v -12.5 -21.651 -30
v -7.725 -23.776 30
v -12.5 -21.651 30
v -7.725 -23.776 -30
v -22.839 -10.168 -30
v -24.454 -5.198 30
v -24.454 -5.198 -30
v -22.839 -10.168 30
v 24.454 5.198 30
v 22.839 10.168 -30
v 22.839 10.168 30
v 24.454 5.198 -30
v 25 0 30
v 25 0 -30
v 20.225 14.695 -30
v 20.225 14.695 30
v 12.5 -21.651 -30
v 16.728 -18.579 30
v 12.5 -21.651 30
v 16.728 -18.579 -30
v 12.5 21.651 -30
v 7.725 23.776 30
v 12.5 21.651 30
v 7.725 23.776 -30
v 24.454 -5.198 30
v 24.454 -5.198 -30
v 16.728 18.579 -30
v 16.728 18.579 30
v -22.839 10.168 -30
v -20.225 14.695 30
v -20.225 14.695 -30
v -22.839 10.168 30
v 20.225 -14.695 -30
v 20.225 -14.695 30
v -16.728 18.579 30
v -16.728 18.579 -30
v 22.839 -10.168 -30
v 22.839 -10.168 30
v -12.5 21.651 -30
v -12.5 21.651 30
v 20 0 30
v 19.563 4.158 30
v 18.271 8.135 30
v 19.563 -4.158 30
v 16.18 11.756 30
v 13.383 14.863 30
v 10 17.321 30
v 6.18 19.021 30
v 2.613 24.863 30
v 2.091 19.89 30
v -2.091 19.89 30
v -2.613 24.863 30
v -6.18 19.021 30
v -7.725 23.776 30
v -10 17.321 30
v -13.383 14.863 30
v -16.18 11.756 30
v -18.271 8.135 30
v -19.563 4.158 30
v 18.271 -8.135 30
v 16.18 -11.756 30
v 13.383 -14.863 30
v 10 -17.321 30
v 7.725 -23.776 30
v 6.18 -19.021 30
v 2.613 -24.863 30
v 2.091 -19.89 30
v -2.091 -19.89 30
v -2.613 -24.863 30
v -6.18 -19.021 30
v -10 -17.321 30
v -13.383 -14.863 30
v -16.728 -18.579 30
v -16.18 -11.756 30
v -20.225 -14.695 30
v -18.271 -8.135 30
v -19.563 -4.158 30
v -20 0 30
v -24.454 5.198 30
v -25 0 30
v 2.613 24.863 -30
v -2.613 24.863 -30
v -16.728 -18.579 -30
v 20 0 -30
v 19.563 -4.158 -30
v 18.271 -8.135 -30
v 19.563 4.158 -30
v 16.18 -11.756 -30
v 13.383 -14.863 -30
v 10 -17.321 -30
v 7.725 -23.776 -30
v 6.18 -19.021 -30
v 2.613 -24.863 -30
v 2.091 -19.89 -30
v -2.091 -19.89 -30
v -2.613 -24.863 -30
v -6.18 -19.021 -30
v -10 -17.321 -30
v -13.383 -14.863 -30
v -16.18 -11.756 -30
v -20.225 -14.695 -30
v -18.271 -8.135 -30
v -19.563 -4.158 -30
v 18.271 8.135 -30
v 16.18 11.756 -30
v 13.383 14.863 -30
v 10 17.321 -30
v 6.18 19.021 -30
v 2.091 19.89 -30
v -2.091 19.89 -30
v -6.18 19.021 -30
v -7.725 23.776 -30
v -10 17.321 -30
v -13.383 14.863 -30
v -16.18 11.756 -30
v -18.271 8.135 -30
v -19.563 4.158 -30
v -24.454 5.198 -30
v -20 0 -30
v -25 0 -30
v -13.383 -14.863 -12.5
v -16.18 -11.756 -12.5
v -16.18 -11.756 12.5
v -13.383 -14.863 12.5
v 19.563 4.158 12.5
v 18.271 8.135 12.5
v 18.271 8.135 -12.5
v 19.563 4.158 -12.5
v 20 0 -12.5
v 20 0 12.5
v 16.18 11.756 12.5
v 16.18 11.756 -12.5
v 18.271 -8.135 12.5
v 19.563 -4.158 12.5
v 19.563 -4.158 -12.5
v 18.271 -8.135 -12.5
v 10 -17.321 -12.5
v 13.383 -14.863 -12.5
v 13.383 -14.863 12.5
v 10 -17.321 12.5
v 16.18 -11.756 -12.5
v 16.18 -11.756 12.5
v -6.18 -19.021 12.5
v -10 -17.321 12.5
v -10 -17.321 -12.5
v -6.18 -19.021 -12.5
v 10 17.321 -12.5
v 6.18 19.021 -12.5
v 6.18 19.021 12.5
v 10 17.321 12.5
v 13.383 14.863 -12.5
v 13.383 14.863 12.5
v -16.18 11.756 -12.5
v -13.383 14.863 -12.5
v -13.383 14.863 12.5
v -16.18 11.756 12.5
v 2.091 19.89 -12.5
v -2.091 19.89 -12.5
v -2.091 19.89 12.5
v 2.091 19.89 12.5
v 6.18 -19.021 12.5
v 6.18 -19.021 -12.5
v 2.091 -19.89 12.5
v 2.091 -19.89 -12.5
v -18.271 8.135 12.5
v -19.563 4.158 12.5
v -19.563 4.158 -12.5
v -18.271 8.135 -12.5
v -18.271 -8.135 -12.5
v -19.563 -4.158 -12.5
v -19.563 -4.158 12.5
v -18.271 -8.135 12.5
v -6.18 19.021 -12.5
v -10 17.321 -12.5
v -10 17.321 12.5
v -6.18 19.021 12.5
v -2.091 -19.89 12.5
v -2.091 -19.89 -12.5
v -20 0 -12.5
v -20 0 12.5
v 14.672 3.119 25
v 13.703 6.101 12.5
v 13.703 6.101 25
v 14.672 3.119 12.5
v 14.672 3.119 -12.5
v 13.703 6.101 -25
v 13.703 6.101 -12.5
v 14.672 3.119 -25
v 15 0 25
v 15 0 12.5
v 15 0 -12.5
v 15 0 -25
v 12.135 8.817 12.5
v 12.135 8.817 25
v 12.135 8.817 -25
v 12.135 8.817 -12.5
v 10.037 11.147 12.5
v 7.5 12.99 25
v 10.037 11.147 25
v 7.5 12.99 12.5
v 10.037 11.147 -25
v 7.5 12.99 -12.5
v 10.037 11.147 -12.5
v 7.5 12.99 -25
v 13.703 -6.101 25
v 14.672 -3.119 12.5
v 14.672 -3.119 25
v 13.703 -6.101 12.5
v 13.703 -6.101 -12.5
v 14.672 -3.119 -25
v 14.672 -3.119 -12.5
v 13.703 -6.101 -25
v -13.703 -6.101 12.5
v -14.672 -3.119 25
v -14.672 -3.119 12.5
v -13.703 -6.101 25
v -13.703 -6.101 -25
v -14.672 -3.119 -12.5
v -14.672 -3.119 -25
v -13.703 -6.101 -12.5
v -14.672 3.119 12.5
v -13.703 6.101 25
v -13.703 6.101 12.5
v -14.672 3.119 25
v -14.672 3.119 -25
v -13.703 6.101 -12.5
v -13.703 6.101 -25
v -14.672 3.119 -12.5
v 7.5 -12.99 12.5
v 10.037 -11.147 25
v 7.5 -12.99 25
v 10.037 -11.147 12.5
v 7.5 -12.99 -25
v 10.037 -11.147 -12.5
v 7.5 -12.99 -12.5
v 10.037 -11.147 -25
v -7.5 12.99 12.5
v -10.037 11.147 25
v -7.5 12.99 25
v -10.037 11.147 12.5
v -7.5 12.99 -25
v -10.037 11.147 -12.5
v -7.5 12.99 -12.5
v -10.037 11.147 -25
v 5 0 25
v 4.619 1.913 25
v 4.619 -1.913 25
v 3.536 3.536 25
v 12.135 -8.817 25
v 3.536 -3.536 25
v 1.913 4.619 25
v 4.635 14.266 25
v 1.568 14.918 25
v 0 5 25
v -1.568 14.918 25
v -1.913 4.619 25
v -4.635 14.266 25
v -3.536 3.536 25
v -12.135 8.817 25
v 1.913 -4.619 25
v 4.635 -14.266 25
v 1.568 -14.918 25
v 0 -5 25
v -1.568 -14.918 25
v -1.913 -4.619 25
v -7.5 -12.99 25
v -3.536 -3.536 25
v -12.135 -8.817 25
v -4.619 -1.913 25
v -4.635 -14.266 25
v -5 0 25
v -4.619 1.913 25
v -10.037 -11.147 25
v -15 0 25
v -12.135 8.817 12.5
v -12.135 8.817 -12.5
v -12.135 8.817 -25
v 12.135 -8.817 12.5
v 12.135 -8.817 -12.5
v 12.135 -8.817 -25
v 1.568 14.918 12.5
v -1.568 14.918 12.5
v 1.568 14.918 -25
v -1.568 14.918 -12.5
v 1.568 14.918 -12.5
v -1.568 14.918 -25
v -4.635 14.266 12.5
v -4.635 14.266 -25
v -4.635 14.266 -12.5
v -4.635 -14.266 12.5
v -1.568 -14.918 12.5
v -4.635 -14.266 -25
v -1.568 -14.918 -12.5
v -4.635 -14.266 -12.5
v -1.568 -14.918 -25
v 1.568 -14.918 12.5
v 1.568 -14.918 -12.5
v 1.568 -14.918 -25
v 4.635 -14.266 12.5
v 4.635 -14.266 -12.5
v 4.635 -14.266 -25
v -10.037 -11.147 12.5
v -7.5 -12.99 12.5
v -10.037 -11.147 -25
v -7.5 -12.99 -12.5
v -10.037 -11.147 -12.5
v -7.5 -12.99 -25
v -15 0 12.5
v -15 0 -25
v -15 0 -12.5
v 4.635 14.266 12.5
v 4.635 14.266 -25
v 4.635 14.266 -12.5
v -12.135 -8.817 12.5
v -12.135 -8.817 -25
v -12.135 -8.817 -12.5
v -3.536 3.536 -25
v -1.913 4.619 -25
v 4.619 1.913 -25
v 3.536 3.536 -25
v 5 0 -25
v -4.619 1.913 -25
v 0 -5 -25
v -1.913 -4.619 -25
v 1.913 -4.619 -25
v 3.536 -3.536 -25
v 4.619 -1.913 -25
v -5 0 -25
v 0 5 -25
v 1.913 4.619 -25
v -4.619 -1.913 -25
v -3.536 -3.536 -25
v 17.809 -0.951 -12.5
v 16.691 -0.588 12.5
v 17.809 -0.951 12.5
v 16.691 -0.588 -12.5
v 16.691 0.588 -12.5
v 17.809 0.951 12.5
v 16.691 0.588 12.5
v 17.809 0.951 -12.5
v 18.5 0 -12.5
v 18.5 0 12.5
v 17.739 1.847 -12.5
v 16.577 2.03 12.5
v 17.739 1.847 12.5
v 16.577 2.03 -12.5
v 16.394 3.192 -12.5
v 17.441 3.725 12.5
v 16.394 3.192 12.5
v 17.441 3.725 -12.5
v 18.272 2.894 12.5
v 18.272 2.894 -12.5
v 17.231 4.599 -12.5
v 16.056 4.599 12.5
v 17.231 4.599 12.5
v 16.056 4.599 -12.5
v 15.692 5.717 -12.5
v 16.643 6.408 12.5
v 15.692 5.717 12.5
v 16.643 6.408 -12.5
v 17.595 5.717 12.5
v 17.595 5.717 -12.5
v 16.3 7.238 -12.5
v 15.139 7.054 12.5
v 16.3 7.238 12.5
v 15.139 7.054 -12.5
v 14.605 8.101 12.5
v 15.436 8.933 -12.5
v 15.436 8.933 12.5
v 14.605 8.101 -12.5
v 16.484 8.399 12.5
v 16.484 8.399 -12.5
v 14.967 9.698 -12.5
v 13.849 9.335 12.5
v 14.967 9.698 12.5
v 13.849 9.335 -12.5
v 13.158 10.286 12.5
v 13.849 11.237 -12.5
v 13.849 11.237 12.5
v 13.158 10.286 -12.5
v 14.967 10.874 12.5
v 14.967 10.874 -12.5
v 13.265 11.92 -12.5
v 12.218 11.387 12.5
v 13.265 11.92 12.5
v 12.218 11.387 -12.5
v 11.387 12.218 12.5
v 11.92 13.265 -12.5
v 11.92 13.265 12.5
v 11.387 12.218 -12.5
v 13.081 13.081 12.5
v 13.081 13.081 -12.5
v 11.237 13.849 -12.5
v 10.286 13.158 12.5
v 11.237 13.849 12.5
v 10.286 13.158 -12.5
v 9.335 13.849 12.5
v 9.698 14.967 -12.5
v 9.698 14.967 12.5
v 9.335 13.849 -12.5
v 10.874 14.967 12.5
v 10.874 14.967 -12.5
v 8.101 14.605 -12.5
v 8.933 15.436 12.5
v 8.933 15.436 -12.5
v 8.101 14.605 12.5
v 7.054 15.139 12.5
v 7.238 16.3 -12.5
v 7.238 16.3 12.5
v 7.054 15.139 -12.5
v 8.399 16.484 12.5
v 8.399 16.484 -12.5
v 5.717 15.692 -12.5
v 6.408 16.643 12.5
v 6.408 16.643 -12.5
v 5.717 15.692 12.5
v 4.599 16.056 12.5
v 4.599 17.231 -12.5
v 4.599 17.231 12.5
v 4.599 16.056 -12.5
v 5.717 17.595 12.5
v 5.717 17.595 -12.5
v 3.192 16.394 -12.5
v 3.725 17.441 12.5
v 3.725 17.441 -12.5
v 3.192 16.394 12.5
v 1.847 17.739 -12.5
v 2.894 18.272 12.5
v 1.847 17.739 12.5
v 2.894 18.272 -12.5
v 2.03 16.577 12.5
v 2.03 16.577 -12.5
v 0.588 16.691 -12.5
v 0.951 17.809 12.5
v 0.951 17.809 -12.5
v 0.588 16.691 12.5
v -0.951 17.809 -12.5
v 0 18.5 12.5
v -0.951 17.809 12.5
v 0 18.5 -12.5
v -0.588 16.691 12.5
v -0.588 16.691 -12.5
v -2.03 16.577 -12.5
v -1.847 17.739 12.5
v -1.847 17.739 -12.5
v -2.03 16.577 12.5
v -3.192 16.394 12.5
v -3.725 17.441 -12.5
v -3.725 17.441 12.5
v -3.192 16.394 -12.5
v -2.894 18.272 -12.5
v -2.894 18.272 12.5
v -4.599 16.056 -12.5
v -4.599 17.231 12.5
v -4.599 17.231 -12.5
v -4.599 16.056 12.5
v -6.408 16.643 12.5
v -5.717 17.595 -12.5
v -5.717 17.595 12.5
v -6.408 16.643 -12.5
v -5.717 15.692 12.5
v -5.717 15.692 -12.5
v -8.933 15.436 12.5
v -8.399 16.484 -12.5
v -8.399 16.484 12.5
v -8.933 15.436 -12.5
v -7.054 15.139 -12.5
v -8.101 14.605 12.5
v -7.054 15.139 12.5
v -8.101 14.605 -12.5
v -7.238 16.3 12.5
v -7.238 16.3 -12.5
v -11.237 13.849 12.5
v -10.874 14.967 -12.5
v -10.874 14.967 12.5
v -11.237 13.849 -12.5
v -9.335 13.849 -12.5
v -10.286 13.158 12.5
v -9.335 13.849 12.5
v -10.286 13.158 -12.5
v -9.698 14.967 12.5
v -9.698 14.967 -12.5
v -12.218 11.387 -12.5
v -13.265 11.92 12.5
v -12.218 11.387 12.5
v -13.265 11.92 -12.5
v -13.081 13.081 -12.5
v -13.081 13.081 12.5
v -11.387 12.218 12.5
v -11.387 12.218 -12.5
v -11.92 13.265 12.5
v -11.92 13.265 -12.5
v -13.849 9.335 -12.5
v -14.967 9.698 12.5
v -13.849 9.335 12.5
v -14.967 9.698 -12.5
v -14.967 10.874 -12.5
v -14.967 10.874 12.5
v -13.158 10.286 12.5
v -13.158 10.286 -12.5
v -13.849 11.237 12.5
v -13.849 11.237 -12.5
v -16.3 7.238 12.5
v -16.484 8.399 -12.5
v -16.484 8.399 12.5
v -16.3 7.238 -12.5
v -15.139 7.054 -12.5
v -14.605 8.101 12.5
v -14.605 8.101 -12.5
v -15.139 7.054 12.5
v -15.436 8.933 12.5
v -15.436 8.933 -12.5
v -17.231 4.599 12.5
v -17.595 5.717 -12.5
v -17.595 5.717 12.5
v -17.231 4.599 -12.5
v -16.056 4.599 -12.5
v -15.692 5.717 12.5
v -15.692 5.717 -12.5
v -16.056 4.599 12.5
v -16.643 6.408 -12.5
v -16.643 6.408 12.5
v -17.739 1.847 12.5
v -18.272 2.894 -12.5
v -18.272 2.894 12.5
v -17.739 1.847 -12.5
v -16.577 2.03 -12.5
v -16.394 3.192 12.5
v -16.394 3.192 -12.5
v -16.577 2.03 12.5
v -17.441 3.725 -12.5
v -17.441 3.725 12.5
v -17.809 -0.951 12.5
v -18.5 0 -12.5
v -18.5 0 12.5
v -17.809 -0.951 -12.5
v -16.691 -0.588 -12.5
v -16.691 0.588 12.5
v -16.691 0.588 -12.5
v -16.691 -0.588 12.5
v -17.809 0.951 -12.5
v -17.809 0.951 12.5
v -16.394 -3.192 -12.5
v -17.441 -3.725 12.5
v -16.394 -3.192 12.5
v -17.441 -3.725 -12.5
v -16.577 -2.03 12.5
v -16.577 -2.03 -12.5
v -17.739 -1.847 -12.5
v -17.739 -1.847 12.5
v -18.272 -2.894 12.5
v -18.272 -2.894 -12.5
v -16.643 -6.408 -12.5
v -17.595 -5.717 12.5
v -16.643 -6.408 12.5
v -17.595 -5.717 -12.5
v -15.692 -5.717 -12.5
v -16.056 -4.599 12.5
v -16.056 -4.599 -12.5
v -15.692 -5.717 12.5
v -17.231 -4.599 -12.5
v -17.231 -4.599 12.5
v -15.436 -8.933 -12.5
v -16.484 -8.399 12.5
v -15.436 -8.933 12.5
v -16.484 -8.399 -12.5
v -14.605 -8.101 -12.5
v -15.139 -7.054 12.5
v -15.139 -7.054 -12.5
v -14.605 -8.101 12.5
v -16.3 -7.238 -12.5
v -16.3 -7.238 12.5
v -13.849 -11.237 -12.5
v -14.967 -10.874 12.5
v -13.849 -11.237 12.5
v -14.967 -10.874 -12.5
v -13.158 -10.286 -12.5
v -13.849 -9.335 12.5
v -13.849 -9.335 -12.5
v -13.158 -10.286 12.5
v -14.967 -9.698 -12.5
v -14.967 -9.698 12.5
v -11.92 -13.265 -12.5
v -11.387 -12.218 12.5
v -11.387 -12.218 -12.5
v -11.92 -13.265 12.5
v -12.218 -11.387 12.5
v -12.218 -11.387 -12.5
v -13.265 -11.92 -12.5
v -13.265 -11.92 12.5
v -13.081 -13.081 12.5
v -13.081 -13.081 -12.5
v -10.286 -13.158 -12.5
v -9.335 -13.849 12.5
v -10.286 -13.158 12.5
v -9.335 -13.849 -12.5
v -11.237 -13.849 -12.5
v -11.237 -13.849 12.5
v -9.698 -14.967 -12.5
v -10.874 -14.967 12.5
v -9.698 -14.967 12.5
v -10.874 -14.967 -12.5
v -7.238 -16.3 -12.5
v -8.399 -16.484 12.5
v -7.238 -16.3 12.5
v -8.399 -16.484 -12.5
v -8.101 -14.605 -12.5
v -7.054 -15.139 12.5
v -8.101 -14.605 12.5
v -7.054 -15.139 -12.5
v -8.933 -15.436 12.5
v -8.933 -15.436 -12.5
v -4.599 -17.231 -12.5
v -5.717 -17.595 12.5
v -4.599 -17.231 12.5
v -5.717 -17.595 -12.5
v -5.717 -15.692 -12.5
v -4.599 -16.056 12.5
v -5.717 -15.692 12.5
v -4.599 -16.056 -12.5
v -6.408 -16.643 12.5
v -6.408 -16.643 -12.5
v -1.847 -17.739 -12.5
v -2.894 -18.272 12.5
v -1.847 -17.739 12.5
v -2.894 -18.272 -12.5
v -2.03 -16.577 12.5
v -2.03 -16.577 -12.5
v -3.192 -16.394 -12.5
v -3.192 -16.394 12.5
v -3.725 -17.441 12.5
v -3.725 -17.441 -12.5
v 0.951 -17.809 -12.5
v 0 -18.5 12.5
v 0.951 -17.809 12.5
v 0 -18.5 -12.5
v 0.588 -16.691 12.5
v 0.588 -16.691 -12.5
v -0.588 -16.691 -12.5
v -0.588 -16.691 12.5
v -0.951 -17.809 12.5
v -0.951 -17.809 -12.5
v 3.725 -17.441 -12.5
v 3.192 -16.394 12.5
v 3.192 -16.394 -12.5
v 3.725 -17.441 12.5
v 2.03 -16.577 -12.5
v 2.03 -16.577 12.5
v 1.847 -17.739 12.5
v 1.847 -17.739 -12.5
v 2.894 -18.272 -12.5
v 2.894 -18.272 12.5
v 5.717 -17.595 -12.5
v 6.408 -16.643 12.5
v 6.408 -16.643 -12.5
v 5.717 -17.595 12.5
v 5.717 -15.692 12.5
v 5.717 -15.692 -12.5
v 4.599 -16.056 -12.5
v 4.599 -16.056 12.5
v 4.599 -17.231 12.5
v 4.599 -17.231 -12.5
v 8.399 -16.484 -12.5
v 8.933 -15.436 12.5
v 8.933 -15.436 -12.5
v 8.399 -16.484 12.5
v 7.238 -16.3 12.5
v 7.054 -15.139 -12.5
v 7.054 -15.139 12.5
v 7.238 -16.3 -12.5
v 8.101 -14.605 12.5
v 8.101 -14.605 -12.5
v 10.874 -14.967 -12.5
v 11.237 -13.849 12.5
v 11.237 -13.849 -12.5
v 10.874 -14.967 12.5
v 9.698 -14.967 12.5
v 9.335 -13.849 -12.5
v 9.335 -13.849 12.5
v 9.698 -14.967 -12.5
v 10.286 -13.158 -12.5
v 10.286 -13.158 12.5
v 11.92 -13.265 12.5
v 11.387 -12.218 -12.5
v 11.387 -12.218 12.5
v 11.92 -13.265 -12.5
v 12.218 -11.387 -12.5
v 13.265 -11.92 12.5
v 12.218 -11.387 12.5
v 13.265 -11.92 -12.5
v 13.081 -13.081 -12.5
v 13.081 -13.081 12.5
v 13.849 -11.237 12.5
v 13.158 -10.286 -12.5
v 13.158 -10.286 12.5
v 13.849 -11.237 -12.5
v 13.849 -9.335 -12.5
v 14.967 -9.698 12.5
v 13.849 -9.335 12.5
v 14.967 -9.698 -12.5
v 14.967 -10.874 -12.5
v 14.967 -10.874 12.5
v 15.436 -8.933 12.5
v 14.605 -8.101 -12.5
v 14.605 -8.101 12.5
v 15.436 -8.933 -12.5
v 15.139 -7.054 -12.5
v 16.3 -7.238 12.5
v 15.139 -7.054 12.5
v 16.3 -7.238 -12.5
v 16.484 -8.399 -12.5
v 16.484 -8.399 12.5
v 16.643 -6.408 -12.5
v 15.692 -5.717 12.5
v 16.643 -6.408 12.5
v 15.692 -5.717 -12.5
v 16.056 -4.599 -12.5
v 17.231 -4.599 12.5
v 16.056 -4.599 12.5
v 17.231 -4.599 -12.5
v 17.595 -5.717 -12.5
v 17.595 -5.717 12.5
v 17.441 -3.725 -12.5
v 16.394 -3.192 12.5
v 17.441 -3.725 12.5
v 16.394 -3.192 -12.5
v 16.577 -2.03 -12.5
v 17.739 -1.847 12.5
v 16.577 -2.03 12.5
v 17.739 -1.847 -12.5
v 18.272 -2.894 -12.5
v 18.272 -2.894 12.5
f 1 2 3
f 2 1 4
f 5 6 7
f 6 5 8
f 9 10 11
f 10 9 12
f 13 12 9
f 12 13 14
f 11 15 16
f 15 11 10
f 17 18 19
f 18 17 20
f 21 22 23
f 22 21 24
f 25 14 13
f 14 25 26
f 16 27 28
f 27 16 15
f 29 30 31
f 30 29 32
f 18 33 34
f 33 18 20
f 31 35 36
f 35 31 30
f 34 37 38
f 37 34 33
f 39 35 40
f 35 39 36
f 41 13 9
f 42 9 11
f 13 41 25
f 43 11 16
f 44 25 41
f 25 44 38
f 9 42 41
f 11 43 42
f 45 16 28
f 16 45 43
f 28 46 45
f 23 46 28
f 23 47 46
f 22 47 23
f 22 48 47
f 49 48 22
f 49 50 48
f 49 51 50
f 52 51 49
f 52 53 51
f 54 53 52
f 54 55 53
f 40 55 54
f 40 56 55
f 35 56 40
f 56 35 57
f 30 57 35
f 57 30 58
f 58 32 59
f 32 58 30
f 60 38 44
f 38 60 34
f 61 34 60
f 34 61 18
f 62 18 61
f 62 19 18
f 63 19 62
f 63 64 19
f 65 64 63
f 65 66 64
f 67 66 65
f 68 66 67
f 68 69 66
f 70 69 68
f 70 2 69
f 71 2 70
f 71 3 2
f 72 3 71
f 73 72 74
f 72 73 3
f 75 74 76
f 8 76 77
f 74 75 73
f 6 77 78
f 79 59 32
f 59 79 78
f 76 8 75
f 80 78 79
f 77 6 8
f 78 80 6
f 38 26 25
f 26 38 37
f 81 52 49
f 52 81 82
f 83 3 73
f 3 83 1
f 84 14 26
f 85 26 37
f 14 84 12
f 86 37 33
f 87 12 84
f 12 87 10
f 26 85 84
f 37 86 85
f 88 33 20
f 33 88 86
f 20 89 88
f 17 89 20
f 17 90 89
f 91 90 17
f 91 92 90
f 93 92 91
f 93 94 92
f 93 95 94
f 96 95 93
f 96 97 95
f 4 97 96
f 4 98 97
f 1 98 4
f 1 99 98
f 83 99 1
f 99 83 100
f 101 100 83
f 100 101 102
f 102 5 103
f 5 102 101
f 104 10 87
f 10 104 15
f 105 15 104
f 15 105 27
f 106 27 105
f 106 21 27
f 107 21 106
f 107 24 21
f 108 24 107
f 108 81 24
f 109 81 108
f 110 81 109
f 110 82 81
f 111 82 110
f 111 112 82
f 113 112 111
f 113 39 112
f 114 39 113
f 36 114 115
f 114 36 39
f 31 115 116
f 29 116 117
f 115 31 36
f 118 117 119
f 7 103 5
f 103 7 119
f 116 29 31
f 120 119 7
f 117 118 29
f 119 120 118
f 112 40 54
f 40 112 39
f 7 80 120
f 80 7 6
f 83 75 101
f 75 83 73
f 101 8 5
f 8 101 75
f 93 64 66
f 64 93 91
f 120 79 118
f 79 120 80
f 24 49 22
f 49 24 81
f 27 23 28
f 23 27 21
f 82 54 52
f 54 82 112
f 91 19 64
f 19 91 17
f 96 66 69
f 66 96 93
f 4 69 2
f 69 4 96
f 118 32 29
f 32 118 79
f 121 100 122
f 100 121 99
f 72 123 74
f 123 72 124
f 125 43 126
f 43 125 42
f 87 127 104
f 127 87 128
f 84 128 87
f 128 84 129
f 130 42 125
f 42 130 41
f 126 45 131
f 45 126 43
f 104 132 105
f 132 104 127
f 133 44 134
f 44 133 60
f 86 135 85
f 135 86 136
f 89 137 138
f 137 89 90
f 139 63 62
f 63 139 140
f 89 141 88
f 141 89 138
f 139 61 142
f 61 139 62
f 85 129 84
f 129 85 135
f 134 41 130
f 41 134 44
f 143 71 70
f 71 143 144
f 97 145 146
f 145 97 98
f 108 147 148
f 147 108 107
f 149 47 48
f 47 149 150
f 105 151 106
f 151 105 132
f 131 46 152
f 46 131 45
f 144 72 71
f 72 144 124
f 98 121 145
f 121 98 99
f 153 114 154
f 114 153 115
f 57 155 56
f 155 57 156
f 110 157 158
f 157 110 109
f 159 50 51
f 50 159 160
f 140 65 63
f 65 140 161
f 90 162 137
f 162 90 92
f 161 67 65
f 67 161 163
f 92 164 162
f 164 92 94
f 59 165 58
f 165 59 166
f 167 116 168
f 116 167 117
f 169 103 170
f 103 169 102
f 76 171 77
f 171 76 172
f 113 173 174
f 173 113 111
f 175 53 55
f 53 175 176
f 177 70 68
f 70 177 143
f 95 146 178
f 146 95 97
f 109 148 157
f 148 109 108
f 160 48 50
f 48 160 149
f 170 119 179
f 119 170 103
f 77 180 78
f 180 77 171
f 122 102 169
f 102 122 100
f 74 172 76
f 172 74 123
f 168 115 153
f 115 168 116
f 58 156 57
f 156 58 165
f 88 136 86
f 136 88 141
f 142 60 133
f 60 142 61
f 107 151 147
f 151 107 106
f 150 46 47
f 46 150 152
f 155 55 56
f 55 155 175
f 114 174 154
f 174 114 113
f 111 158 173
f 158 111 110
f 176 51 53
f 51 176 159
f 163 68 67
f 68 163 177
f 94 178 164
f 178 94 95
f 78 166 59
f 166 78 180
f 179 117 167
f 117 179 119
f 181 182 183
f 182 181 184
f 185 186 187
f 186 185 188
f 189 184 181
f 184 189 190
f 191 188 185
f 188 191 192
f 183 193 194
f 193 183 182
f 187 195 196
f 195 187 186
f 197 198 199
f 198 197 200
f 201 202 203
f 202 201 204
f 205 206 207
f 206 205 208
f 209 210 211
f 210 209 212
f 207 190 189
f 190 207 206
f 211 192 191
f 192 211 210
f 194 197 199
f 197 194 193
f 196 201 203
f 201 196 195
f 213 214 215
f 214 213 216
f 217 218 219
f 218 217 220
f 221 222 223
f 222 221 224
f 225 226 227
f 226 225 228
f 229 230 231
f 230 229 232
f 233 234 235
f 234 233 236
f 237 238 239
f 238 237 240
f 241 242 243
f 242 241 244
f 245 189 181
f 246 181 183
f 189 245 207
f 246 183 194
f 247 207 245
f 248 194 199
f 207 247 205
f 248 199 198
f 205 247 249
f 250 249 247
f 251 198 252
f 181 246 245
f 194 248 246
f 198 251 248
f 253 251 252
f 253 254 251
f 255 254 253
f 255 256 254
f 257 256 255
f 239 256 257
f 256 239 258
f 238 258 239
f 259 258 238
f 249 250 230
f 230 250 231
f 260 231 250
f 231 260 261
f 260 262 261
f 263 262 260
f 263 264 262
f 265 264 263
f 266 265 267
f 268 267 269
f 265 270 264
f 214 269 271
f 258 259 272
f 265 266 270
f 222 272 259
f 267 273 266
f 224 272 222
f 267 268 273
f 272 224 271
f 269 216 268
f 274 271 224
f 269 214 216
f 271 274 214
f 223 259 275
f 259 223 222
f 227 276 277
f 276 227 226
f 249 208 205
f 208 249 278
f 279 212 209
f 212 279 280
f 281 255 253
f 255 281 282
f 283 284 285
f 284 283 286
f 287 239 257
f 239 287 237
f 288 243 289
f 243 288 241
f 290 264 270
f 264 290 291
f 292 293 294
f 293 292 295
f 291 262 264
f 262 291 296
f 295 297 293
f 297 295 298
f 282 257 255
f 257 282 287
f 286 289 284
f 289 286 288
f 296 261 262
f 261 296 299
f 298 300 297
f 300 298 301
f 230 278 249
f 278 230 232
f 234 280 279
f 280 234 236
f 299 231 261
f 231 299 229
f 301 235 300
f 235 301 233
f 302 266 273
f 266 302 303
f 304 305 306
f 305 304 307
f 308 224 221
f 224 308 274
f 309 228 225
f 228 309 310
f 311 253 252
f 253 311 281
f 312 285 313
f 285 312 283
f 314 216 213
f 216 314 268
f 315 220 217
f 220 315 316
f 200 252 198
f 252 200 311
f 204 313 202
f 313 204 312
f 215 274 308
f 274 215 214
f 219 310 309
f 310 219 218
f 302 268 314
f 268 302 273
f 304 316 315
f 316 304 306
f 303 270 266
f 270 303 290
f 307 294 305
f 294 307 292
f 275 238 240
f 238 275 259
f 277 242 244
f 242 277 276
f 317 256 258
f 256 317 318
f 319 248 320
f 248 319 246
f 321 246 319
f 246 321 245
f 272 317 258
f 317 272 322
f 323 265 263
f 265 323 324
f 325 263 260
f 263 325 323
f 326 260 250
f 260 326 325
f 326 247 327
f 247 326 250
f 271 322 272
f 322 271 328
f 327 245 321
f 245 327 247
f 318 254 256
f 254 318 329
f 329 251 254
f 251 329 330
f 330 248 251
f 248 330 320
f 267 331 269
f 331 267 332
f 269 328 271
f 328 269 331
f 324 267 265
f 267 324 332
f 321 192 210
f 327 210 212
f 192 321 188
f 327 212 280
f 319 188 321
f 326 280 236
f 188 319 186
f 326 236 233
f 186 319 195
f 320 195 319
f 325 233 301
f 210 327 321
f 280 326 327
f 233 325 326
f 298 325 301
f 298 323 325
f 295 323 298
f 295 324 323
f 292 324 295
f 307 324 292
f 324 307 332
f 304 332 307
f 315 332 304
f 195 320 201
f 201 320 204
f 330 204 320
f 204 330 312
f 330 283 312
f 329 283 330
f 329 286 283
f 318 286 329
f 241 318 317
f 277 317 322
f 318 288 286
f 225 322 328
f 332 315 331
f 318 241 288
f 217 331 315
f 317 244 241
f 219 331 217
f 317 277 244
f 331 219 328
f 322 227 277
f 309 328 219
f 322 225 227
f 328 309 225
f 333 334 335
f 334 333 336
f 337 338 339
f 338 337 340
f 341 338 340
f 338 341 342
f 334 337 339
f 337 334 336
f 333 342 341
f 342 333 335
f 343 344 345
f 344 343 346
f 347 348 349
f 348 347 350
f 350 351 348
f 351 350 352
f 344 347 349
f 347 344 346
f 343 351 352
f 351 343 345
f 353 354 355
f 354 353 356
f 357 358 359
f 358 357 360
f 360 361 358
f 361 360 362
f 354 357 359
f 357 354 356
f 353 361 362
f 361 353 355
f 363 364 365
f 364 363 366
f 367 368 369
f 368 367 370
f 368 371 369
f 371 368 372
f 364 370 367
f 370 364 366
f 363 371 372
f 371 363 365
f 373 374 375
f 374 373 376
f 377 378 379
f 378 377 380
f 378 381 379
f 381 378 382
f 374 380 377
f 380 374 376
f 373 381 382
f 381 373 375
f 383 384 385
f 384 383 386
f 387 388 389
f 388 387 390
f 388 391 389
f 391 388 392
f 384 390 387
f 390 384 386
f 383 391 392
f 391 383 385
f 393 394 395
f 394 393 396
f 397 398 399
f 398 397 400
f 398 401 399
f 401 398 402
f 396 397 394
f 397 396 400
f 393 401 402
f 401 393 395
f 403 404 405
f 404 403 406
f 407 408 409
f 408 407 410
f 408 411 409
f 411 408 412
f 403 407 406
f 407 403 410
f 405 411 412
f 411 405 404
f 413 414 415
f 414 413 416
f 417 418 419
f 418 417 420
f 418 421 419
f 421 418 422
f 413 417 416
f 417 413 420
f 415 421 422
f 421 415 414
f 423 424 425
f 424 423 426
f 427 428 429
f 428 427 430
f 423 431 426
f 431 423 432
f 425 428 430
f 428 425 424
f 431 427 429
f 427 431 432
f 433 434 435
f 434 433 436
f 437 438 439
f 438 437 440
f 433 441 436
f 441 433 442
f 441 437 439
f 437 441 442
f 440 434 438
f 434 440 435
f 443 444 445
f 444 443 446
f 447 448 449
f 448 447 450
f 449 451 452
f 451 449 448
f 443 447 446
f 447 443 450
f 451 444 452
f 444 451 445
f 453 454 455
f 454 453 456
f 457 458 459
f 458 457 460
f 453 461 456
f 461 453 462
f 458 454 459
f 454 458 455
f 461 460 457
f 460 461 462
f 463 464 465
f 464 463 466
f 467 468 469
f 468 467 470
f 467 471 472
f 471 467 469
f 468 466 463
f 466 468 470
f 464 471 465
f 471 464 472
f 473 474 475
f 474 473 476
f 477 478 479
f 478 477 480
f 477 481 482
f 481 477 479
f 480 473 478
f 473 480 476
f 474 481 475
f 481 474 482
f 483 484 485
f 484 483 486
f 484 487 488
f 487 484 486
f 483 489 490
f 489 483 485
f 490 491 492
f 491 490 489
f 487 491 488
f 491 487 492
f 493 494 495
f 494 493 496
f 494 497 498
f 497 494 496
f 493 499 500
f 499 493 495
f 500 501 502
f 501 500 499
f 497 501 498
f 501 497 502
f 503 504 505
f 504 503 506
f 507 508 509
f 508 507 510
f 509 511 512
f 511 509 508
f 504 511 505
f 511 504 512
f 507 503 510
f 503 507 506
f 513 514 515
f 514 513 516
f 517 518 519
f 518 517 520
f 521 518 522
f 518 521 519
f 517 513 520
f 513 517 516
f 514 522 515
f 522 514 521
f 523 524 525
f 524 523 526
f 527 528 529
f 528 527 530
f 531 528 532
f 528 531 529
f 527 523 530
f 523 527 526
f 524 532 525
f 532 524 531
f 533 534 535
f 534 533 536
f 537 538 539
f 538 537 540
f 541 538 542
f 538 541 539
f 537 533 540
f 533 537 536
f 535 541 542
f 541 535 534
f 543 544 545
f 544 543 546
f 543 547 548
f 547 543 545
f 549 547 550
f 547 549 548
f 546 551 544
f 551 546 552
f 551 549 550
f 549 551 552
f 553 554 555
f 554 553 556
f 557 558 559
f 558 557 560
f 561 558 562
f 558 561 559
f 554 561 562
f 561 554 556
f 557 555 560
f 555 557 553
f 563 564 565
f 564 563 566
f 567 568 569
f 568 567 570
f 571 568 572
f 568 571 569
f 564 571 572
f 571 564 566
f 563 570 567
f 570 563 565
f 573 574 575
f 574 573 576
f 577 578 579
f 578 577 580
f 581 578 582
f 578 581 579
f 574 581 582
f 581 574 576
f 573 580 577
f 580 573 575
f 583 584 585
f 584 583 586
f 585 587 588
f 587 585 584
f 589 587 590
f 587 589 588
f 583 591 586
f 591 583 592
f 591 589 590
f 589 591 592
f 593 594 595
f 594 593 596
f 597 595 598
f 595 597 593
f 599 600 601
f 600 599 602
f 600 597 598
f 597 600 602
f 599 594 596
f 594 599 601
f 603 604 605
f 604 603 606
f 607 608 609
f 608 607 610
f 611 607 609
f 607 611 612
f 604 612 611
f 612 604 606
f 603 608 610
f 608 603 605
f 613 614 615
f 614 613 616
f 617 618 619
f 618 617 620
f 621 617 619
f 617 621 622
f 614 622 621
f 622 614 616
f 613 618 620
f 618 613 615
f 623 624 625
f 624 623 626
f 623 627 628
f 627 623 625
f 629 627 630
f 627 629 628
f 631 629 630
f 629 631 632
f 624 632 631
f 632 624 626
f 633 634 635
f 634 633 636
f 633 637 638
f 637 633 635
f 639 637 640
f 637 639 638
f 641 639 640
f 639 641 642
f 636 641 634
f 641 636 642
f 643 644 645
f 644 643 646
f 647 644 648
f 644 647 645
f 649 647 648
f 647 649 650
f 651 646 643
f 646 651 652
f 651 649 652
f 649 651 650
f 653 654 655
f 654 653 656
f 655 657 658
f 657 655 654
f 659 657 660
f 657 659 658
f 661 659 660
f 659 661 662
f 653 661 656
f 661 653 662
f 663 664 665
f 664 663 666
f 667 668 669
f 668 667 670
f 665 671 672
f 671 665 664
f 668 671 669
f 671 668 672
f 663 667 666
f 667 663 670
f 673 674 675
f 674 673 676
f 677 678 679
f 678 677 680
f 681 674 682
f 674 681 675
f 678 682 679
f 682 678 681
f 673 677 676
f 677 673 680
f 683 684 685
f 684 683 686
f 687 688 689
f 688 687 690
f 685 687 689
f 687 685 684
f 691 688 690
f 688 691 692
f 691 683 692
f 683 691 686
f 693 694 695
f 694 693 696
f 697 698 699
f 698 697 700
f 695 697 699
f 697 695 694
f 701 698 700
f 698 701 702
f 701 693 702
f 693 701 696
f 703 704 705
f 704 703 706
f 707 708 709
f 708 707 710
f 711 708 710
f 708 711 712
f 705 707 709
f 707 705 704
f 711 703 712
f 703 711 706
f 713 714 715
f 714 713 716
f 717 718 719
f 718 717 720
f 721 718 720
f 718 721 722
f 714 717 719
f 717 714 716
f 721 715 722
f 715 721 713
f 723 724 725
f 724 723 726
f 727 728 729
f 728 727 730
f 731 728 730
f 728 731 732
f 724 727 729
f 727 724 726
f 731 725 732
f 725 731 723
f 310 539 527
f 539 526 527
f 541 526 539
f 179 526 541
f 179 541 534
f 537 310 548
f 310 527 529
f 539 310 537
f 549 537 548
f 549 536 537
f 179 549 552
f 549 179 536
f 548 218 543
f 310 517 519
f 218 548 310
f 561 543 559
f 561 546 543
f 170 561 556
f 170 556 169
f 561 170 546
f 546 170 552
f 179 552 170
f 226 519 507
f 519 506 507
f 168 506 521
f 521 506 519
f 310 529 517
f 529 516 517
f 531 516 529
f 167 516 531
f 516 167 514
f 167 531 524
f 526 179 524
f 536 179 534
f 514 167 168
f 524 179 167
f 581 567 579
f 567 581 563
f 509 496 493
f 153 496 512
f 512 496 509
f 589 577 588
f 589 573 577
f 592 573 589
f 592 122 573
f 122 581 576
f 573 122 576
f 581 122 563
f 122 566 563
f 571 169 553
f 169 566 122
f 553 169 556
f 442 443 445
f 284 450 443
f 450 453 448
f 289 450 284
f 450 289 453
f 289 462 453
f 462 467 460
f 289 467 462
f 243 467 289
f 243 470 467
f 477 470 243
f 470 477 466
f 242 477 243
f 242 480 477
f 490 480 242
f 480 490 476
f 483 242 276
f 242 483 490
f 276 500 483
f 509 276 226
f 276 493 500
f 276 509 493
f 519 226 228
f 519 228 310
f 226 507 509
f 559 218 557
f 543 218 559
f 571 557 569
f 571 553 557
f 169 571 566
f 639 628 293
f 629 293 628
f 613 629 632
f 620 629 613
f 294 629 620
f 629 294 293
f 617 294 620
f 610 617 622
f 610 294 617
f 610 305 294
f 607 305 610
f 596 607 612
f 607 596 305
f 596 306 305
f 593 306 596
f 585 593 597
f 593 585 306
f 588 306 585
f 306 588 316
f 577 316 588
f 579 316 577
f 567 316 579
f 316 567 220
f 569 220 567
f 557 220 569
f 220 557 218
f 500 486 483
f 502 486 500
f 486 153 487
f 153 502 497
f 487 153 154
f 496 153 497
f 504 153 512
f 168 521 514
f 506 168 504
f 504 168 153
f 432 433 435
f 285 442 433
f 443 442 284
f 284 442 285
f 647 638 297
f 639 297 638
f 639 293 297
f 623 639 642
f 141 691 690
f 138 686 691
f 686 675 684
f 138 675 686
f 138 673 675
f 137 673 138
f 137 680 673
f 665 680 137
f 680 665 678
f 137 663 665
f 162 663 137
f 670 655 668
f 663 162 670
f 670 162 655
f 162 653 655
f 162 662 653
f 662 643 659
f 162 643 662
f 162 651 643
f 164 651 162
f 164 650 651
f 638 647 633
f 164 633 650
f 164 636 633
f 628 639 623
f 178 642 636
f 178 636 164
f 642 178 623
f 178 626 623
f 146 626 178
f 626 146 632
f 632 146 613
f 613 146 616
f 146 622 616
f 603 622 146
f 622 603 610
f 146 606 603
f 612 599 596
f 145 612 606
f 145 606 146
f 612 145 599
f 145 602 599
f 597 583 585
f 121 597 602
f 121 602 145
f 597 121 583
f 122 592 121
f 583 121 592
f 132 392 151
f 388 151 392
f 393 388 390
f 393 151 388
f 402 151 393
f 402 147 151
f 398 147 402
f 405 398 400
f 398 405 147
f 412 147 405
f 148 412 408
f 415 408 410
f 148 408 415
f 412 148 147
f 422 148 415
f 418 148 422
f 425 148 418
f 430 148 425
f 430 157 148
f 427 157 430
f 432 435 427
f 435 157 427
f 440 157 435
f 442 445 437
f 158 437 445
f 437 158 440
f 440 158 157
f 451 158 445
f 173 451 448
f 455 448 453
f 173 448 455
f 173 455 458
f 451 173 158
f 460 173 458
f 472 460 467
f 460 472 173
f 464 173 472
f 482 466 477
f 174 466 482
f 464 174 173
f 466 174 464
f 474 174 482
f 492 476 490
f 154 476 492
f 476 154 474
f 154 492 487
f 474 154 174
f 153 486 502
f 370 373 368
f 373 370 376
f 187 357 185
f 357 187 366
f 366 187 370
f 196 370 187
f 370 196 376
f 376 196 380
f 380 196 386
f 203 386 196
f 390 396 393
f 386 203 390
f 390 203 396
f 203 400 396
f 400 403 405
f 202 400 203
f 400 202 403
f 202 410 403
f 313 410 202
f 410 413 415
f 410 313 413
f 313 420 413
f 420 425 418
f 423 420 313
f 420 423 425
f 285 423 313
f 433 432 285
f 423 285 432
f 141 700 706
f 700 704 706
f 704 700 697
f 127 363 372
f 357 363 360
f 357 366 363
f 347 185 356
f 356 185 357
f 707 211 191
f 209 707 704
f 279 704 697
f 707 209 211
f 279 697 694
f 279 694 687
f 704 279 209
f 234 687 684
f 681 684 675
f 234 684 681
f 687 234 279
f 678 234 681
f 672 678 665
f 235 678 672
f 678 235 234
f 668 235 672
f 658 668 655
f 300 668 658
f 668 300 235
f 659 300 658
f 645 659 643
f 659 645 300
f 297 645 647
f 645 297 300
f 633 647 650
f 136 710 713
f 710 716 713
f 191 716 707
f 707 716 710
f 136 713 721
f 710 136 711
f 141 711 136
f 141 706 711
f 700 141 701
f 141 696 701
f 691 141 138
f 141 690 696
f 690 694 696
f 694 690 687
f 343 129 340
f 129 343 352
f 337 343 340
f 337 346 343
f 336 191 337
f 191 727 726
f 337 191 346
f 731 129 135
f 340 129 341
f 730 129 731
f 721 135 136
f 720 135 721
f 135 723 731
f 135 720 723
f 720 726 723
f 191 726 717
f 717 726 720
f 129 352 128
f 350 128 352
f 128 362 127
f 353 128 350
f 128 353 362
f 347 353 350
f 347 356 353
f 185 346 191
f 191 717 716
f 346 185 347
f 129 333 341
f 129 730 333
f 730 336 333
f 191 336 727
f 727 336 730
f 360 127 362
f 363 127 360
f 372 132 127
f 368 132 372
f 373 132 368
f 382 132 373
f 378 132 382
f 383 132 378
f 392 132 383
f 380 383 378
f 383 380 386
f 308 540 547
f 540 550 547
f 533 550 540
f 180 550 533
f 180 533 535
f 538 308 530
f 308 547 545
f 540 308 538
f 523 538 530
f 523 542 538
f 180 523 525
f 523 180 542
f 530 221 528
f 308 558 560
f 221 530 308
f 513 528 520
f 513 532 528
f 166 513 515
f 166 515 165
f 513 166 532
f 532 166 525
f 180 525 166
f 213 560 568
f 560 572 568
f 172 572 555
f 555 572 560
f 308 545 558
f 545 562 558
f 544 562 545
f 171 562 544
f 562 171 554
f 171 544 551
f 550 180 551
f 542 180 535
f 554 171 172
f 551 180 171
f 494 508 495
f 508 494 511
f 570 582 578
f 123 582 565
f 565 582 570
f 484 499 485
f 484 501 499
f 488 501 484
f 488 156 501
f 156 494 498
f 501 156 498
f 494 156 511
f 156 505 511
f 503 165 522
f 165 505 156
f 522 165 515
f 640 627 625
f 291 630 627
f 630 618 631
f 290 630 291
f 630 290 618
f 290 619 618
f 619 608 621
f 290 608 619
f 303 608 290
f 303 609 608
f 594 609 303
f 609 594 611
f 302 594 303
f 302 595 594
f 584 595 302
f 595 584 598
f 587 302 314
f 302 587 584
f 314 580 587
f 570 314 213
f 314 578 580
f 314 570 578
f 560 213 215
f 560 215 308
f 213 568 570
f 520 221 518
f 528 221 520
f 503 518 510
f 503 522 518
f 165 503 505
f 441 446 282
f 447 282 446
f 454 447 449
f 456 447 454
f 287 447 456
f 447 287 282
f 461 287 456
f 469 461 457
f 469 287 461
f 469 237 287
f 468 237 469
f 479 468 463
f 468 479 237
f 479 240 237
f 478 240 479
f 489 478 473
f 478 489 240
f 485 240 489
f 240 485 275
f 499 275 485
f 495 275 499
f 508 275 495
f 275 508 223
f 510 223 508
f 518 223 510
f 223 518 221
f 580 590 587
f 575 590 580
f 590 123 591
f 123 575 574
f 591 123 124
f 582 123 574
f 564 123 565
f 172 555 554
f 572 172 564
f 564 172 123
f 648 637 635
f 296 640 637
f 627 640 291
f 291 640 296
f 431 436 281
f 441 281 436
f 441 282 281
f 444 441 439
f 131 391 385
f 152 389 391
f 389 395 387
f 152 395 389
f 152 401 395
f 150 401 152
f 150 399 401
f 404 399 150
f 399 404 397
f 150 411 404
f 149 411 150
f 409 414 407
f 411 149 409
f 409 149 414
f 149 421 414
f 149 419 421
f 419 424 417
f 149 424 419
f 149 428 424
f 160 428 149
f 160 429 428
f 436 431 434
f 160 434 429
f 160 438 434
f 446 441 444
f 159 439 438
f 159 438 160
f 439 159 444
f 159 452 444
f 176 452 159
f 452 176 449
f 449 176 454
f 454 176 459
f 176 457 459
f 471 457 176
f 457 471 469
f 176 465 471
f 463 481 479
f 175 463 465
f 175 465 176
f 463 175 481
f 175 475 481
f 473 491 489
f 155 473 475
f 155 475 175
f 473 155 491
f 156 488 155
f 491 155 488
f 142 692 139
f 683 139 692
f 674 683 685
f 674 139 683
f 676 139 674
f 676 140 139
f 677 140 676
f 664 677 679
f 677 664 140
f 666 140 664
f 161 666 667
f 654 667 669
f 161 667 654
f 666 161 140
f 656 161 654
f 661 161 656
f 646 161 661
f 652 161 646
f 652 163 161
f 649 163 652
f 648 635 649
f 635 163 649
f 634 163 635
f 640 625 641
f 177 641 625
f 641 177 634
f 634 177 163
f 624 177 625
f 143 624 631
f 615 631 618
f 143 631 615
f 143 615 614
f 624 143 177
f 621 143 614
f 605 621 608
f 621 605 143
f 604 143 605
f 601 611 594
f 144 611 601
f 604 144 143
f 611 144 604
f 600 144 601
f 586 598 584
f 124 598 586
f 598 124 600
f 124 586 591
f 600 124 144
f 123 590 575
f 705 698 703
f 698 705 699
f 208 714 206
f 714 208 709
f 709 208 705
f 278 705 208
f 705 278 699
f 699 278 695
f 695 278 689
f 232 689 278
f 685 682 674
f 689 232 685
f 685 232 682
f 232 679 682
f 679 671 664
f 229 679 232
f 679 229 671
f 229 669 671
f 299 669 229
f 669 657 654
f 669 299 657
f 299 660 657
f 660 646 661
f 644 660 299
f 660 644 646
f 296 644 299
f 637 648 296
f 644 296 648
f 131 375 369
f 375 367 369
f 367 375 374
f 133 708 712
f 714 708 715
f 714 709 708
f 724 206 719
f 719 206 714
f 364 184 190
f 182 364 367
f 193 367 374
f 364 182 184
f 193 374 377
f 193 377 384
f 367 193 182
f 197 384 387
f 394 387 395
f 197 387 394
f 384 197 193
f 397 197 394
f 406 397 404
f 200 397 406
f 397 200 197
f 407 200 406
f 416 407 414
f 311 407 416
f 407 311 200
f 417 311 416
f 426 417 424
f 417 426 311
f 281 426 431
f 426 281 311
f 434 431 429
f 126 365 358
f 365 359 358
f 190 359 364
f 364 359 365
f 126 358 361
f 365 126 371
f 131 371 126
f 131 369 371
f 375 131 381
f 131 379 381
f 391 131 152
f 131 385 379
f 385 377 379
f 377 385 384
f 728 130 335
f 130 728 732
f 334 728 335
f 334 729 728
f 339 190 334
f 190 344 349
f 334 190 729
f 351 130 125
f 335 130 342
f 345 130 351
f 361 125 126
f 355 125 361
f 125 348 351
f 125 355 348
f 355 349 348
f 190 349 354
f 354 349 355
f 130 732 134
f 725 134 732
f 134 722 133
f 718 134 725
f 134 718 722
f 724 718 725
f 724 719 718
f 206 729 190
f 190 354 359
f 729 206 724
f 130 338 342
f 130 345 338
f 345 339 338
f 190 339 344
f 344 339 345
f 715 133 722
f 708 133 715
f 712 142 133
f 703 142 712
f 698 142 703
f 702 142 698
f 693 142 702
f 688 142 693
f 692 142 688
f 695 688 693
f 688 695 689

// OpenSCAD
// Parameters
outer_diameter = 50;
outer_length = 60;
wall_thickness = 5;
inner_hub_diameter = 30;
inner_hub_length = 25;
shaft_hole_diameter = 10;
elastomer_thickness = 5;
tooth_count = 40;
tooth_depth = 2;

// Outer Casing
module outer_casing() {
    difference() {
        cylinder(d=outer_diameter, h=outer_length, center=true);
        cylinder(d=outer_diameter - 2 * wall_thickness, h=outer_length, center=true);
    }
}

// Inner Hub
module inner_hub() {
    difference() {
        cylinder(d=inner_hub_diameter, h=inner_hub_length, center=true);
        cylinder(d=shaft_hole_diameter, h=inner_hub_length + 2, center=true);
    }
}

// Elastomeric Coupling Element
module elastomeric_coupling_element() {
    difference() {
        cylinder(d=inner_hub_diameter + 2 * elastomer_thickness, h=inner_hub_length, center=true);
        cylinder(d=inner_hub_diameter, h=inner_hub_length + 2, center=true);
        
        // Create teeth
        for (i = [0:tooth_count-1]) {
            rotate([0, 0, i * 360 / tooth_count])
                translate([(inner_hub_diameter + elastomer_thickness) / 2, 0, 0])
                cylinder(d=tooth_depth, h=inner_hub_length + 2, center=true);
        }
    }
}

// Assemble the coupling
module flexible_coupling() {
    outer_casing();
    
    translate([0, 0, inner_hub_length / 2])
        inner_hub();
    
    translate([0, 0, -inner_hub_length / 2])
        inner_hub();
    
    elastomeric_coupling_element();
}

// Render the model
flexible_coupling();
